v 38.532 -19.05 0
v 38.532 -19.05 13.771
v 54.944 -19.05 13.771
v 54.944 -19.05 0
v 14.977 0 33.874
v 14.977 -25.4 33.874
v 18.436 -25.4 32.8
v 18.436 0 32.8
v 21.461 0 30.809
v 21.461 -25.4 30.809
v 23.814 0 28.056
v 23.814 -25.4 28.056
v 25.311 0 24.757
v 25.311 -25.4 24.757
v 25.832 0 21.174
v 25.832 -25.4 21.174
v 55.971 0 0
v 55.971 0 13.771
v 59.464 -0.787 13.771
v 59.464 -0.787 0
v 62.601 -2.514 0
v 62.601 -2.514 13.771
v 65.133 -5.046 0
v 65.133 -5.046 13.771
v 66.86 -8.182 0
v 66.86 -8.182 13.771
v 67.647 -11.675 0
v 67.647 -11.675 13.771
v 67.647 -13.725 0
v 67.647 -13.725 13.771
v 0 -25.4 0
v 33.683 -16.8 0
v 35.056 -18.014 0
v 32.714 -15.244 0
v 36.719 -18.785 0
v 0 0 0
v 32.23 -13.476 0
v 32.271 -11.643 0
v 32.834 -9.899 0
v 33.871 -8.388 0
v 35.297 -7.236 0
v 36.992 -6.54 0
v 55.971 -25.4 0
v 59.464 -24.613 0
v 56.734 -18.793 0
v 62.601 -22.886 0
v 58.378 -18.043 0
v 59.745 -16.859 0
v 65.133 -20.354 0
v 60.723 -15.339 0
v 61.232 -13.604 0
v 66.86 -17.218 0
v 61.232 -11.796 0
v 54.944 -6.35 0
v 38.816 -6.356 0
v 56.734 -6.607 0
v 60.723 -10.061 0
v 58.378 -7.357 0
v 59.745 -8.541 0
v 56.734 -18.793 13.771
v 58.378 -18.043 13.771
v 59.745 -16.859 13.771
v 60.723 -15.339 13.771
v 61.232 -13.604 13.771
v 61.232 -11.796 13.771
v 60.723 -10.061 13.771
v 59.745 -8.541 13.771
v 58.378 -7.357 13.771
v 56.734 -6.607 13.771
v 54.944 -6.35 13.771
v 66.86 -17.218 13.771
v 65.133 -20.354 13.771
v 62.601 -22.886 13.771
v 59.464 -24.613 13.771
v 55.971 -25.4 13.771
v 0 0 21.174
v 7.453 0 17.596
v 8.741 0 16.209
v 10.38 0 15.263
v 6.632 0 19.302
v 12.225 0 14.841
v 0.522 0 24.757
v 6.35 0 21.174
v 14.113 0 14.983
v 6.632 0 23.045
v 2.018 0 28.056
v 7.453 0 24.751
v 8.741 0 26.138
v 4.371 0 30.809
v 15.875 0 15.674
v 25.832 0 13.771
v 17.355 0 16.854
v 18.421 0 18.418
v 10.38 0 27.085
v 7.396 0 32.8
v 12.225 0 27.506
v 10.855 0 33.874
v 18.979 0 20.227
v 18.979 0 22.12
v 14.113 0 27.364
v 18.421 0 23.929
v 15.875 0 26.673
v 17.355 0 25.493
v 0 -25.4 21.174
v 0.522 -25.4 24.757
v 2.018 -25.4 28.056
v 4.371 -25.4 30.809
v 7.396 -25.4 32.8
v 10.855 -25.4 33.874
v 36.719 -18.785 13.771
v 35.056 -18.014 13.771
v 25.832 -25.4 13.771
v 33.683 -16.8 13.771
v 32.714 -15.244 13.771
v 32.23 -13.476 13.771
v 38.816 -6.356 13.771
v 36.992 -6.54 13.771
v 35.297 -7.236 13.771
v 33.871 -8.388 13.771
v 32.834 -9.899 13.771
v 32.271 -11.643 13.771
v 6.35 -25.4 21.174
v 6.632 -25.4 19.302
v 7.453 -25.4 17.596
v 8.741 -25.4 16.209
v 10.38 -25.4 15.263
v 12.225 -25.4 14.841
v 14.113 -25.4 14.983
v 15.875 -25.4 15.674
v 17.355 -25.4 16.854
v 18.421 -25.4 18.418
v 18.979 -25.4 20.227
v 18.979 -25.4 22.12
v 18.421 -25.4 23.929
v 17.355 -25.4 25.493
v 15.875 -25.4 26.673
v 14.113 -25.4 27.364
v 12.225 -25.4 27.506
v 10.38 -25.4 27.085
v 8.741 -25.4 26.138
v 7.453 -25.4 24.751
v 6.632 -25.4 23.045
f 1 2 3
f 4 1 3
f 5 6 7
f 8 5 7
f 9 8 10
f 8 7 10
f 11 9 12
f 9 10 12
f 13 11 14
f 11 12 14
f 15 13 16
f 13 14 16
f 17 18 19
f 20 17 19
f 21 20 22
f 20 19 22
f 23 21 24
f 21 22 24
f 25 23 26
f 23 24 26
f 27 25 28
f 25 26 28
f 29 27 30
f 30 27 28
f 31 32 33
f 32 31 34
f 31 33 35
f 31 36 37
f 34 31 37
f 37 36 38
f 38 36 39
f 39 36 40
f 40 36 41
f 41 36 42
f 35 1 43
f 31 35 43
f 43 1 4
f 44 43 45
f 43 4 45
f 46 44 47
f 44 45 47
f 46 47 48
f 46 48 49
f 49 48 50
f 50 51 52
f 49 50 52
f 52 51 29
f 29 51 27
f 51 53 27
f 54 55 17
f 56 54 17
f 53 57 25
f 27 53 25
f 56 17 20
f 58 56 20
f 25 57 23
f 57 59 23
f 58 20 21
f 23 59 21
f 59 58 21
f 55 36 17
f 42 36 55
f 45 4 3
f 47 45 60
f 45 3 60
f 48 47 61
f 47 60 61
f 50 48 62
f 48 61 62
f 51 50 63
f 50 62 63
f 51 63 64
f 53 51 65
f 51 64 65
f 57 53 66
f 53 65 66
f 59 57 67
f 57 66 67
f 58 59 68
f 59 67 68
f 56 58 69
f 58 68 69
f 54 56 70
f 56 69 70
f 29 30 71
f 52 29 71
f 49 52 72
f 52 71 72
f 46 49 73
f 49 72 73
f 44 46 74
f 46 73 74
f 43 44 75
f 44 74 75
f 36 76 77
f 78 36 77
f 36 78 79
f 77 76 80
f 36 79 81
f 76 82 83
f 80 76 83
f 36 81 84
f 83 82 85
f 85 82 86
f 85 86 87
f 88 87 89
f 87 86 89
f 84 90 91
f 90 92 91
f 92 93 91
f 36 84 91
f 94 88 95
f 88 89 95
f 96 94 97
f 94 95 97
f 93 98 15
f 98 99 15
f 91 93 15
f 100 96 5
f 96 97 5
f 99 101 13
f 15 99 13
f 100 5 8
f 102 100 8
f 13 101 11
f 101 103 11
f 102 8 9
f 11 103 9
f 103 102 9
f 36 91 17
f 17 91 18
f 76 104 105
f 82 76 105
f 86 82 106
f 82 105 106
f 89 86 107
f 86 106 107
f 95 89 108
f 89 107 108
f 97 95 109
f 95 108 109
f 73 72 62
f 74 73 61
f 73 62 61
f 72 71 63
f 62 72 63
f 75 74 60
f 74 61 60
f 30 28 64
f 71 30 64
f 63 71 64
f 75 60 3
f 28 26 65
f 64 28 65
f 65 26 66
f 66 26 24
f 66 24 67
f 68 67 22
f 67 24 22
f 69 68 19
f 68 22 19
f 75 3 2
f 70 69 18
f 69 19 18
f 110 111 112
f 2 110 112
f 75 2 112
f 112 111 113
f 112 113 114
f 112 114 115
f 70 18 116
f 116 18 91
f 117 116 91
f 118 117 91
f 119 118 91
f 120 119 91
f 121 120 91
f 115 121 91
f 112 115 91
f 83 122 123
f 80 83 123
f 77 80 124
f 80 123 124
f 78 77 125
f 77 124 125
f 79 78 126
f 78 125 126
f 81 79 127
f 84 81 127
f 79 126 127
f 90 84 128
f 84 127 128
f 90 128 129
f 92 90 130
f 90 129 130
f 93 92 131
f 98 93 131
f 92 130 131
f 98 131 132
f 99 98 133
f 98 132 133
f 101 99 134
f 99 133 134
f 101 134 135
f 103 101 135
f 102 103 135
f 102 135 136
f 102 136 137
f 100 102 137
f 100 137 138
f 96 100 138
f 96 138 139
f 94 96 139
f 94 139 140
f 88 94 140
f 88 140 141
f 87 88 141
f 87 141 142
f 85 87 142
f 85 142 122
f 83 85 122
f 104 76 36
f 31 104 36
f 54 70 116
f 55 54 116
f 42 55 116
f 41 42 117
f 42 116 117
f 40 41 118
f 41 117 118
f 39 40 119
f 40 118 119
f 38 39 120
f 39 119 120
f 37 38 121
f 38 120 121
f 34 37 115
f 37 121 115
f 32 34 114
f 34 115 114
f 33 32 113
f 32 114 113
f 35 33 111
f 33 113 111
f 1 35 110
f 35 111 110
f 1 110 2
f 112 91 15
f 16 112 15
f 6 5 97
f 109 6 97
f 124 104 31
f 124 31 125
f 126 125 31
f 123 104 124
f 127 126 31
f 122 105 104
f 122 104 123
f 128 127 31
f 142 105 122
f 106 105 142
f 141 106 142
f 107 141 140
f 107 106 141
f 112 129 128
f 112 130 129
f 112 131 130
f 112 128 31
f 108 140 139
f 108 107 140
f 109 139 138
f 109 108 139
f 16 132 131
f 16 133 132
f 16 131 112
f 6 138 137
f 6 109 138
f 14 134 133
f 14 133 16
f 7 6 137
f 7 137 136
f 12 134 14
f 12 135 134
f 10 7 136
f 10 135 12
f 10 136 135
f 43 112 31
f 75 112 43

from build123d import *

# Parameters (mm, degrees)
F1_DEPTH = 25.4
F3_DEPTH = 50.8
F4_R     = 6.35
F5_DEPTH = 13.7715663219
F7_DEPTH = 13.7715663219
F9_DEPTH = 13.7715663219


with BuildPart() as f1:
    # F0 (on Front) → F1 (new body)
    with BuildSketch(Plane.XZ):
        Polygon((0, 33.8735803962), (0, 0), (67.6466450095, 0), (67.6466450095, 13.7705663219), (25.8323773742, 13.7705663219), (25.8323773742, 33.8735803962), align=None)
    extrude(amount=F1_DEPTH)

    # F2 (on face) → F3 (cut)
    with BuildSketch(Plane.XZ.offset(25.4)):
        with BuildLine():
            Line((0, 33.8735803962), (0, 21.1735803962))
            ThreePointArc((0, 21.1735803962), (3.0977100292, 29.5149442417), (10.8550581005, 33.8735803962))
            Line((10.8550581005, 33.8735803962), (0, 33.8735803962))
        make_face()
        with BuildLine():
            ThreePointArc((19.05, 21.1735803962), (12.7, 27.5235803962), (6.35, 21.1735803962))
            Line((6.35, 21.1735803962), (12.7, 21.1735803962))
            Line((12.7, 21.1735803962), (19.05, 21.1735803962))
        make_face()
        with BuildLine():
            Line((12.7, 21.1735803962), (6.35, 21.1735803962))
            ThreePointArc((6.35, 21.1735803962), (12.7, 14.8235803962), (19.05, 21.1735803962))
            Line((19.05, 21.1735803962), (12.7, 21.1735803962))
        make_face()
        with BuildLine():
            Line((25.8323773742, 33.8735803962), (14.9773192737, 33.8735803962))
            ThreePointArc((14.9773192737, 33.8735803962), (22.734667345, 29.5149442417), (25.8323773742, 21.1735803962))
            Line((25.8323773742, 21.1735803962), (25.8323773742, 33.8735803962))
        make_face()
    extrude(amount=-F3_DEPTH, mode=Mode.SUBTRACT)

    # F4 (on face) → F5 (cut, through all)
    with BuildSketch(Plane.XY.offset(13.7705663219)):
        with Locations((38.5323773742, -12.7)):
            Circle(F4_R)
        with Locations((54.9466450095, -12.7)):
            Circle(F4_R)
    extrude(amount=-F5_DEPTH, mode=Mode.SUBTRACT)

    # F6 (on face) → F7 (cut, through all)
    with BuildSketch(Plane.XY.offset(13.7705663219)):
        with BuildLine():
            Line((54.9441526312, -6.3500004891), (38.8158588696, -6.3563308534))
            ThreePointArc((38.8158588696, -6.3563308534), (43.121636982, -8.3112420605), (44.8823773742, -12.7))
            ThreePointArc((44.8823773742, -12.7), (43.0225055016, -17.1901279936), (38.5323775634, -19.05))
            Line((38.5323775634, -19.05), (54.9441526312, -19.0499995109))
            ThreePointArc((54.9441526312, -19.0499995109), (48.5966450095, -12.7), (54.9441526312, -6.3500004891))
        make_face()
    extrude(amount=-F7_DEPTH, mode=Mode.SUBTRACT)

    # F8 (on face) → F9 (cut, through all)
    with BuildSketch(Plane.XY.offset(13.7705663219)):
        with BuildLine():
            ThreePointArc((55.9713775557, 0), (63.9560866346, -3.6905583749), (67.6466450095, -11.6752674539))
            Line((67.6466450095, -11.6752674539), (67.6466450095, 0))
            Line((67.6466450095, 0), (55.9713775557, 0))
        make_face()
        with BuildLine():
            Line((67.6466450095, -25.4), (67.6466450095, -13.7247325461))
            ThreePointArc((67.6466450095, -13.7247325461), (63.9560866346, -21.7094416251), (55.9713775557, -25.4))
            Line((55.9713775557, -25.4), (67.6466450095, -25.4))
        make_face()
        with BuildLine():
            Line((53.9219124634, 0), (55.9713775557, 0))
            ThreePointArc((55.9713775557, 0), (54.9466450095, 0.0412745356), (53.9219124634, 0))
        make_face()
    extrude(amount=-F9_DEPTH, mode=Mode.SUBTRACT)


solid = f1.part
